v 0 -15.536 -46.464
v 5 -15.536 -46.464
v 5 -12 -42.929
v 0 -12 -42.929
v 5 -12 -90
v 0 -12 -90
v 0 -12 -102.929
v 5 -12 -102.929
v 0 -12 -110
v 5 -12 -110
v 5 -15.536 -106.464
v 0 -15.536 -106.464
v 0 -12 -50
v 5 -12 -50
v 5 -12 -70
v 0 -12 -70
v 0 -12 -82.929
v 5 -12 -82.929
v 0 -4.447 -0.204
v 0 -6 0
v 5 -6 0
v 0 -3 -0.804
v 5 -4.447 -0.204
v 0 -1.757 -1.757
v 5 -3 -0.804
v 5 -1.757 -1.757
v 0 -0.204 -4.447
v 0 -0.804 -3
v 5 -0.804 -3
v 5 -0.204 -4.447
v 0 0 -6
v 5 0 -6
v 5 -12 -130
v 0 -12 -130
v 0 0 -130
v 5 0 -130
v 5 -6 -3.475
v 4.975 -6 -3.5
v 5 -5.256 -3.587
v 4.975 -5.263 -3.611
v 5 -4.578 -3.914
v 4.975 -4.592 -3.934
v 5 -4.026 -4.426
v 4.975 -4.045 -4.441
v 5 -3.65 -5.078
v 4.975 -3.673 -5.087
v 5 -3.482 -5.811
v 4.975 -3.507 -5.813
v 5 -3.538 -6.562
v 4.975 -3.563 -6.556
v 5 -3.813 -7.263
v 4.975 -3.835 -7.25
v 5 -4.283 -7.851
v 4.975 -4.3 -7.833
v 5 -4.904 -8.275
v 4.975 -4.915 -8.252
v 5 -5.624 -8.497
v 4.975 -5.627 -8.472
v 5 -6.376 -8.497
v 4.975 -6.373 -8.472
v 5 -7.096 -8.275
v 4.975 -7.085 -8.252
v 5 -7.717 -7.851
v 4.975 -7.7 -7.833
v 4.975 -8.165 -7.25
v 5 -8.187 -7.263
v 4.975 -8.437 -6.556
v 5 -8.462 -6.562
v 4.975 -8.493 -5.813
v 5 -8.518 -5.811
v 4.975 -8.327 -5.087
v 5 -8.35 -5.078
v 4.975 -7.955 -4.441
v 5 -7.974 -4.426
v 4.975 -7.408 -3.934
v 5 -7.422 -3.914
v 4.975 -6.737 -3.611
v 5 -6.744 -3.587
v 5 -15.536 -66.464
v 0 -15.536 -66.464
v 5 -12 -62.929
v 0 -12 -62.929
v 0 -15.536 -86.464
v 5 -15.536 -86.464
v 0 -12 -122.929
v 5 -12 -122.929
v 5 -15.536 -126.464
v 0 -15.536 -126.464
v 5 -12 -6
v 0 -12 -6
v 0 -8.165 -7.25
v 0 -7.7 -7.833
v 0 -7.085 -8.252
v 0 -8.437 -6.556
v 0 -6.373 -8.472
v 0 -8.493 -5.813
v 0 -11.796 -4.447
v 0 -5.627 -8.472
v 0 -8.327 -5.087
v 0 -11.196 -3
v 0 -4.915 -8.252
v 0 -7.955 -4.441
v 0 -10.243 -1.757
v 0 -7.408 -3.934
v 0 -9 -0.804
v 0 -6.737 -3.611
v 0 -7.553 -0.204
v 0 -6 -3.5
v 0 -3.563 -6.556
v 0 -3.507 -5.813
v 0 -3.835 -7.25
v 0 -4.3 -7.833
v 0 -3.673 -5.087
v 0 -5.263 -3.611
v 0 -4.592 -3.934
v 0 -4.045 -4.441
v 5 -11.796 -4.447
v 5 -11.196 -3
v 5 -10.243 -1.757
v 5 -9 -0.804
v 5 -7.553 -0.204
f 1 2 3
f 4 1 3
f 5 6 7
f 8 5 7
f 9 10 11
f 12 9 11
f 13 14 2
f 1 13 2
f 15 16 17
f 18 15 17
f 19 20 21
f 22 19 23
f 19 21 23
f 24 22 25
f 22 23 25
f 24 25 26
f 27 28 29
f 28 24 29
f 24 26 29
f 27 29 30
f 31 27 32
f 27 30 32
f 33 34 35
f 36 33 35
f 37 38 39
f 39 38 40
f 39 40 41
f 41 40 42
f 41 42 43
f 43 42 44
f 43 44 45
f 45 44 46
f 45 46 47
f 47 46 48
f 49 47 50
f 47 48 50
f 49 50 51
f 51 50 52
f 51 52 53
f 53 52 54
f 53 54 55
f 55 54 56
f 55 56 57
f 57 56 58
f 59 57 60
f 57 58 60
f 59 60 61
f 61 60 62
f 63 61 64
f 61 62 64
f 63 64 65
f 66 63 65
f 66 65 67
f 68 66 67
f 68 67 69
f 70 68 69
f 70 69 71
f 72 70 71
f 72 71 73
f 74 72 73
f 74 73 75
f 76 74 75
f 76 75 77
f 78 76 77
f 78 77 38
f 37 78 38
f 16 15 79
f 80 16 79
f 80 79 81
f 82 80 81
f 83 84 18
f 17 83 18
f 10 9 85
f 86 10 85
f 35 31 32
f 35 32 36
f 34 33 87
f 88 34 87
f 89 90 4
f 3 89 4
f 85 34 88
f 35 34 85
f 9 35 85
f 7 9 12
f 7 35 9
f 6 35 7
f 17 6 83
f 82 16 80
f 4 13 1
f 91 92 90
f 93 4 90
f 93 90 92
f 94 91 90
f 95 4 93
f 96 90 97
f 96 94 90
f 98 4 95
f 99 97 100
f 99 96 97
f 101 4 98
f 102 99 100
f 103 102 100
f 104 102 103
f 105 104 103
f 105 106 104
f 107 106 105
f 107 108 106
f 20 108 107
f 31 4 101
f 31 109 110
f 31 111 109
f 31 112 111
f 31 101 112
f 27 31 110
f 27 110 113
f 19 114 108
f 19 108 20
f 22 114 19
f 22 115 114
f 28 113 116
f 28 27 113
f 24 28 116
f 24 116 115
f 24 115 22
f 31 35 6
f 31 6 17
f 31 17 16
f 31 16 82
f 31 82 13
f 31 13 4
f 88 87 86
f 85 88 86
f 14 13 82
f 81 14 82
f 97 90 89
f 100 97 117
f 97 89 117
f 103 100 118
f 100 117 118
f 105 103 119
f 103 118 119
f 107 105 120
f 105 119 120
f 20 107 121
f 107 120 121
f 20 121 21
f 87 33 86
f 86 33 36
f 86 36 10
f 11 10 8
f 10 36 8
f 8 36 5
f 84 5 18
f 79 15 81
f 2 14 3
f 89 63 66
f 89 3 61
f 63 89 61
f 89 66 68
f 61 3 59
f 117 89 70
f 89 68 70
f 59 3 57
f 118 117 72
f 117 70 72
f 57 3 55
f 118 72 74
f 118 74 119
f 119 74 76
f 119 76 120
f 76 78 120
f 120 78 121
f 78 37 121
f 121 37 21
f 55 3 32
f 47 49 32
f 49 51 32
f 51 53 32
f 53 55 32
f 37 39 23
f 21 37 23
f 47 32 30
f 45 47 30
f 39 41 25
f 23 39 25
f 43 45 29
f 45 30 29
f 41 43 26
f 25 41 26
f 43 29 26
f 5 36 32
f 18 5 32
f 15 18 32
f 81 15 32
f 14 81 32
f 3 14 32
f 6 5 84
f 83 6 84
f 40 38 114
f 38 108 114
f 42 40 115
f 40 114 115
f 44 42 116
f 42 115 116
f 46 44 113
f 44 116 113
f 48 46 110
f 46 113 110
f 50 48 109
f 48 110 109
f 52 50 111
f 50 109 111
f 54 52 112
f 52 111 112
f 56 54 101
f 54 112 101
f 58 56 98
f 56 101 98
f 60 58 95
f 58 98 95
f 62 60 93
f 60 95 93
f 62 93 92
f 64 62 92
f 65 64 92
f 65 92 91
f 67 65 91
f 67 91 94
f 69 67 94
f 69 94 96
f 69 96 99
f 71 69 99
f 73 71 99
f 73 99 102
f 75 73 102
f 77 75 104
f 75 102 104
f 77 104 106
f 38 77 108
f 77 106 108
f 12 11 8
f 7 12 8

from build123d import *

# Parameters (mm, degrees)
SKETCH1_W                       = 130
SKETCH1_H                       = 12
BOSS_EXTRUDE1_DEPTH             = 5
BOSS_EXTRUDE2_DEPTH             = 5
CUT_EXTRUDE1_DEPTH              = 132.020428994
F_5_0MM_DOWEL_HOLE1_D           = 5
F_5_0MM_DOWEL_HOLE1_CSINK_D     = 5.05
F_5_0MM_DOWEL_HOLE1_CSINK_ANGLE = 90


with BuildPart() as part:
    # Sketch1 → Boss-Extrude1 (new body)
    with BuildSketch(Plane(origin=(0, 0, 0), x_dir=(0, 0, -1), z_dir=(1, 0, 0))):
        with Locations((65, -6)):
            Rectangle(SKETCH1_W, SKETCH1_H)
    extrude(amount=BOSS_EXTRUDE1_DEPTH)

    # Sketch2 → Boss-Extrude2 (add)
    with BuildSketch(Plane(origin=(5, 0, 0), x_dir=(0, 0, -1), z_dir=(1, 0, 0))):
        Polygon((130, -12), (126.464466094, -15.535533906), (122.928932188, -12), align=None)
        Polygon((106.464466094, -15.535533906), (102.928932188, -12), (110, -12), align=None)
        Polygon((86.464466094, -15.535533906), (82.928932188, -12), (90, -12), align=None)
        Polygon((66.464466094, -15.535533906), (62.928932188, -12), (70, -12), align=None)
        Polygon((46.464466094, -15.535533906), (42.928932188, -12), (50, -12), align=None)
    extrude(amount=-BOSS_EXTRUDE2_DEPTH)

    # Sketch5 → Cut-Extrude1 (cut, through all)
    with BuildSketch(Plane(origin=(5, 0, 0), x_dir=(0, 0, -1), z_dir=(1, 0, 0))):
        with BuildLine():
            ThreePointArc((0, -6), (1.757359313, -1.757359313), (6, 0))
            Line((6, 0), (0, 0))
            Line((0, 0), (0, -6))
        make_face()
        with BuildLine():
            ThreePointArc((6, -12), (1.757359313, -10.242640687), (0, -6))
            Line((0, -6), (0, -12))
            Line((0, -12), (6, -12))
        make_face()
    extrude(amount=-CUT_EXTRUDE1_DEPTH, mode=Mode.SUBTRACT)

    # Ø5.0mm Dowel Hole1 (through all)
    with Locations(Plane(origin=(5, 0, 0), x_dir=(0, 0, -1), z_dir=(1, 0, 0))):
        with Locations((6, -6)):
            CounterSinkHole(F_5_0MM_DOWEL_HOLE1_D / 2, F_5_0MM_DOWEL_HOLE1_CSINK_D / 2, counter_sink_angle=F_5_0MM_DOWEL_HOLE1_CSINK_ANGLE)


solid = part.part
